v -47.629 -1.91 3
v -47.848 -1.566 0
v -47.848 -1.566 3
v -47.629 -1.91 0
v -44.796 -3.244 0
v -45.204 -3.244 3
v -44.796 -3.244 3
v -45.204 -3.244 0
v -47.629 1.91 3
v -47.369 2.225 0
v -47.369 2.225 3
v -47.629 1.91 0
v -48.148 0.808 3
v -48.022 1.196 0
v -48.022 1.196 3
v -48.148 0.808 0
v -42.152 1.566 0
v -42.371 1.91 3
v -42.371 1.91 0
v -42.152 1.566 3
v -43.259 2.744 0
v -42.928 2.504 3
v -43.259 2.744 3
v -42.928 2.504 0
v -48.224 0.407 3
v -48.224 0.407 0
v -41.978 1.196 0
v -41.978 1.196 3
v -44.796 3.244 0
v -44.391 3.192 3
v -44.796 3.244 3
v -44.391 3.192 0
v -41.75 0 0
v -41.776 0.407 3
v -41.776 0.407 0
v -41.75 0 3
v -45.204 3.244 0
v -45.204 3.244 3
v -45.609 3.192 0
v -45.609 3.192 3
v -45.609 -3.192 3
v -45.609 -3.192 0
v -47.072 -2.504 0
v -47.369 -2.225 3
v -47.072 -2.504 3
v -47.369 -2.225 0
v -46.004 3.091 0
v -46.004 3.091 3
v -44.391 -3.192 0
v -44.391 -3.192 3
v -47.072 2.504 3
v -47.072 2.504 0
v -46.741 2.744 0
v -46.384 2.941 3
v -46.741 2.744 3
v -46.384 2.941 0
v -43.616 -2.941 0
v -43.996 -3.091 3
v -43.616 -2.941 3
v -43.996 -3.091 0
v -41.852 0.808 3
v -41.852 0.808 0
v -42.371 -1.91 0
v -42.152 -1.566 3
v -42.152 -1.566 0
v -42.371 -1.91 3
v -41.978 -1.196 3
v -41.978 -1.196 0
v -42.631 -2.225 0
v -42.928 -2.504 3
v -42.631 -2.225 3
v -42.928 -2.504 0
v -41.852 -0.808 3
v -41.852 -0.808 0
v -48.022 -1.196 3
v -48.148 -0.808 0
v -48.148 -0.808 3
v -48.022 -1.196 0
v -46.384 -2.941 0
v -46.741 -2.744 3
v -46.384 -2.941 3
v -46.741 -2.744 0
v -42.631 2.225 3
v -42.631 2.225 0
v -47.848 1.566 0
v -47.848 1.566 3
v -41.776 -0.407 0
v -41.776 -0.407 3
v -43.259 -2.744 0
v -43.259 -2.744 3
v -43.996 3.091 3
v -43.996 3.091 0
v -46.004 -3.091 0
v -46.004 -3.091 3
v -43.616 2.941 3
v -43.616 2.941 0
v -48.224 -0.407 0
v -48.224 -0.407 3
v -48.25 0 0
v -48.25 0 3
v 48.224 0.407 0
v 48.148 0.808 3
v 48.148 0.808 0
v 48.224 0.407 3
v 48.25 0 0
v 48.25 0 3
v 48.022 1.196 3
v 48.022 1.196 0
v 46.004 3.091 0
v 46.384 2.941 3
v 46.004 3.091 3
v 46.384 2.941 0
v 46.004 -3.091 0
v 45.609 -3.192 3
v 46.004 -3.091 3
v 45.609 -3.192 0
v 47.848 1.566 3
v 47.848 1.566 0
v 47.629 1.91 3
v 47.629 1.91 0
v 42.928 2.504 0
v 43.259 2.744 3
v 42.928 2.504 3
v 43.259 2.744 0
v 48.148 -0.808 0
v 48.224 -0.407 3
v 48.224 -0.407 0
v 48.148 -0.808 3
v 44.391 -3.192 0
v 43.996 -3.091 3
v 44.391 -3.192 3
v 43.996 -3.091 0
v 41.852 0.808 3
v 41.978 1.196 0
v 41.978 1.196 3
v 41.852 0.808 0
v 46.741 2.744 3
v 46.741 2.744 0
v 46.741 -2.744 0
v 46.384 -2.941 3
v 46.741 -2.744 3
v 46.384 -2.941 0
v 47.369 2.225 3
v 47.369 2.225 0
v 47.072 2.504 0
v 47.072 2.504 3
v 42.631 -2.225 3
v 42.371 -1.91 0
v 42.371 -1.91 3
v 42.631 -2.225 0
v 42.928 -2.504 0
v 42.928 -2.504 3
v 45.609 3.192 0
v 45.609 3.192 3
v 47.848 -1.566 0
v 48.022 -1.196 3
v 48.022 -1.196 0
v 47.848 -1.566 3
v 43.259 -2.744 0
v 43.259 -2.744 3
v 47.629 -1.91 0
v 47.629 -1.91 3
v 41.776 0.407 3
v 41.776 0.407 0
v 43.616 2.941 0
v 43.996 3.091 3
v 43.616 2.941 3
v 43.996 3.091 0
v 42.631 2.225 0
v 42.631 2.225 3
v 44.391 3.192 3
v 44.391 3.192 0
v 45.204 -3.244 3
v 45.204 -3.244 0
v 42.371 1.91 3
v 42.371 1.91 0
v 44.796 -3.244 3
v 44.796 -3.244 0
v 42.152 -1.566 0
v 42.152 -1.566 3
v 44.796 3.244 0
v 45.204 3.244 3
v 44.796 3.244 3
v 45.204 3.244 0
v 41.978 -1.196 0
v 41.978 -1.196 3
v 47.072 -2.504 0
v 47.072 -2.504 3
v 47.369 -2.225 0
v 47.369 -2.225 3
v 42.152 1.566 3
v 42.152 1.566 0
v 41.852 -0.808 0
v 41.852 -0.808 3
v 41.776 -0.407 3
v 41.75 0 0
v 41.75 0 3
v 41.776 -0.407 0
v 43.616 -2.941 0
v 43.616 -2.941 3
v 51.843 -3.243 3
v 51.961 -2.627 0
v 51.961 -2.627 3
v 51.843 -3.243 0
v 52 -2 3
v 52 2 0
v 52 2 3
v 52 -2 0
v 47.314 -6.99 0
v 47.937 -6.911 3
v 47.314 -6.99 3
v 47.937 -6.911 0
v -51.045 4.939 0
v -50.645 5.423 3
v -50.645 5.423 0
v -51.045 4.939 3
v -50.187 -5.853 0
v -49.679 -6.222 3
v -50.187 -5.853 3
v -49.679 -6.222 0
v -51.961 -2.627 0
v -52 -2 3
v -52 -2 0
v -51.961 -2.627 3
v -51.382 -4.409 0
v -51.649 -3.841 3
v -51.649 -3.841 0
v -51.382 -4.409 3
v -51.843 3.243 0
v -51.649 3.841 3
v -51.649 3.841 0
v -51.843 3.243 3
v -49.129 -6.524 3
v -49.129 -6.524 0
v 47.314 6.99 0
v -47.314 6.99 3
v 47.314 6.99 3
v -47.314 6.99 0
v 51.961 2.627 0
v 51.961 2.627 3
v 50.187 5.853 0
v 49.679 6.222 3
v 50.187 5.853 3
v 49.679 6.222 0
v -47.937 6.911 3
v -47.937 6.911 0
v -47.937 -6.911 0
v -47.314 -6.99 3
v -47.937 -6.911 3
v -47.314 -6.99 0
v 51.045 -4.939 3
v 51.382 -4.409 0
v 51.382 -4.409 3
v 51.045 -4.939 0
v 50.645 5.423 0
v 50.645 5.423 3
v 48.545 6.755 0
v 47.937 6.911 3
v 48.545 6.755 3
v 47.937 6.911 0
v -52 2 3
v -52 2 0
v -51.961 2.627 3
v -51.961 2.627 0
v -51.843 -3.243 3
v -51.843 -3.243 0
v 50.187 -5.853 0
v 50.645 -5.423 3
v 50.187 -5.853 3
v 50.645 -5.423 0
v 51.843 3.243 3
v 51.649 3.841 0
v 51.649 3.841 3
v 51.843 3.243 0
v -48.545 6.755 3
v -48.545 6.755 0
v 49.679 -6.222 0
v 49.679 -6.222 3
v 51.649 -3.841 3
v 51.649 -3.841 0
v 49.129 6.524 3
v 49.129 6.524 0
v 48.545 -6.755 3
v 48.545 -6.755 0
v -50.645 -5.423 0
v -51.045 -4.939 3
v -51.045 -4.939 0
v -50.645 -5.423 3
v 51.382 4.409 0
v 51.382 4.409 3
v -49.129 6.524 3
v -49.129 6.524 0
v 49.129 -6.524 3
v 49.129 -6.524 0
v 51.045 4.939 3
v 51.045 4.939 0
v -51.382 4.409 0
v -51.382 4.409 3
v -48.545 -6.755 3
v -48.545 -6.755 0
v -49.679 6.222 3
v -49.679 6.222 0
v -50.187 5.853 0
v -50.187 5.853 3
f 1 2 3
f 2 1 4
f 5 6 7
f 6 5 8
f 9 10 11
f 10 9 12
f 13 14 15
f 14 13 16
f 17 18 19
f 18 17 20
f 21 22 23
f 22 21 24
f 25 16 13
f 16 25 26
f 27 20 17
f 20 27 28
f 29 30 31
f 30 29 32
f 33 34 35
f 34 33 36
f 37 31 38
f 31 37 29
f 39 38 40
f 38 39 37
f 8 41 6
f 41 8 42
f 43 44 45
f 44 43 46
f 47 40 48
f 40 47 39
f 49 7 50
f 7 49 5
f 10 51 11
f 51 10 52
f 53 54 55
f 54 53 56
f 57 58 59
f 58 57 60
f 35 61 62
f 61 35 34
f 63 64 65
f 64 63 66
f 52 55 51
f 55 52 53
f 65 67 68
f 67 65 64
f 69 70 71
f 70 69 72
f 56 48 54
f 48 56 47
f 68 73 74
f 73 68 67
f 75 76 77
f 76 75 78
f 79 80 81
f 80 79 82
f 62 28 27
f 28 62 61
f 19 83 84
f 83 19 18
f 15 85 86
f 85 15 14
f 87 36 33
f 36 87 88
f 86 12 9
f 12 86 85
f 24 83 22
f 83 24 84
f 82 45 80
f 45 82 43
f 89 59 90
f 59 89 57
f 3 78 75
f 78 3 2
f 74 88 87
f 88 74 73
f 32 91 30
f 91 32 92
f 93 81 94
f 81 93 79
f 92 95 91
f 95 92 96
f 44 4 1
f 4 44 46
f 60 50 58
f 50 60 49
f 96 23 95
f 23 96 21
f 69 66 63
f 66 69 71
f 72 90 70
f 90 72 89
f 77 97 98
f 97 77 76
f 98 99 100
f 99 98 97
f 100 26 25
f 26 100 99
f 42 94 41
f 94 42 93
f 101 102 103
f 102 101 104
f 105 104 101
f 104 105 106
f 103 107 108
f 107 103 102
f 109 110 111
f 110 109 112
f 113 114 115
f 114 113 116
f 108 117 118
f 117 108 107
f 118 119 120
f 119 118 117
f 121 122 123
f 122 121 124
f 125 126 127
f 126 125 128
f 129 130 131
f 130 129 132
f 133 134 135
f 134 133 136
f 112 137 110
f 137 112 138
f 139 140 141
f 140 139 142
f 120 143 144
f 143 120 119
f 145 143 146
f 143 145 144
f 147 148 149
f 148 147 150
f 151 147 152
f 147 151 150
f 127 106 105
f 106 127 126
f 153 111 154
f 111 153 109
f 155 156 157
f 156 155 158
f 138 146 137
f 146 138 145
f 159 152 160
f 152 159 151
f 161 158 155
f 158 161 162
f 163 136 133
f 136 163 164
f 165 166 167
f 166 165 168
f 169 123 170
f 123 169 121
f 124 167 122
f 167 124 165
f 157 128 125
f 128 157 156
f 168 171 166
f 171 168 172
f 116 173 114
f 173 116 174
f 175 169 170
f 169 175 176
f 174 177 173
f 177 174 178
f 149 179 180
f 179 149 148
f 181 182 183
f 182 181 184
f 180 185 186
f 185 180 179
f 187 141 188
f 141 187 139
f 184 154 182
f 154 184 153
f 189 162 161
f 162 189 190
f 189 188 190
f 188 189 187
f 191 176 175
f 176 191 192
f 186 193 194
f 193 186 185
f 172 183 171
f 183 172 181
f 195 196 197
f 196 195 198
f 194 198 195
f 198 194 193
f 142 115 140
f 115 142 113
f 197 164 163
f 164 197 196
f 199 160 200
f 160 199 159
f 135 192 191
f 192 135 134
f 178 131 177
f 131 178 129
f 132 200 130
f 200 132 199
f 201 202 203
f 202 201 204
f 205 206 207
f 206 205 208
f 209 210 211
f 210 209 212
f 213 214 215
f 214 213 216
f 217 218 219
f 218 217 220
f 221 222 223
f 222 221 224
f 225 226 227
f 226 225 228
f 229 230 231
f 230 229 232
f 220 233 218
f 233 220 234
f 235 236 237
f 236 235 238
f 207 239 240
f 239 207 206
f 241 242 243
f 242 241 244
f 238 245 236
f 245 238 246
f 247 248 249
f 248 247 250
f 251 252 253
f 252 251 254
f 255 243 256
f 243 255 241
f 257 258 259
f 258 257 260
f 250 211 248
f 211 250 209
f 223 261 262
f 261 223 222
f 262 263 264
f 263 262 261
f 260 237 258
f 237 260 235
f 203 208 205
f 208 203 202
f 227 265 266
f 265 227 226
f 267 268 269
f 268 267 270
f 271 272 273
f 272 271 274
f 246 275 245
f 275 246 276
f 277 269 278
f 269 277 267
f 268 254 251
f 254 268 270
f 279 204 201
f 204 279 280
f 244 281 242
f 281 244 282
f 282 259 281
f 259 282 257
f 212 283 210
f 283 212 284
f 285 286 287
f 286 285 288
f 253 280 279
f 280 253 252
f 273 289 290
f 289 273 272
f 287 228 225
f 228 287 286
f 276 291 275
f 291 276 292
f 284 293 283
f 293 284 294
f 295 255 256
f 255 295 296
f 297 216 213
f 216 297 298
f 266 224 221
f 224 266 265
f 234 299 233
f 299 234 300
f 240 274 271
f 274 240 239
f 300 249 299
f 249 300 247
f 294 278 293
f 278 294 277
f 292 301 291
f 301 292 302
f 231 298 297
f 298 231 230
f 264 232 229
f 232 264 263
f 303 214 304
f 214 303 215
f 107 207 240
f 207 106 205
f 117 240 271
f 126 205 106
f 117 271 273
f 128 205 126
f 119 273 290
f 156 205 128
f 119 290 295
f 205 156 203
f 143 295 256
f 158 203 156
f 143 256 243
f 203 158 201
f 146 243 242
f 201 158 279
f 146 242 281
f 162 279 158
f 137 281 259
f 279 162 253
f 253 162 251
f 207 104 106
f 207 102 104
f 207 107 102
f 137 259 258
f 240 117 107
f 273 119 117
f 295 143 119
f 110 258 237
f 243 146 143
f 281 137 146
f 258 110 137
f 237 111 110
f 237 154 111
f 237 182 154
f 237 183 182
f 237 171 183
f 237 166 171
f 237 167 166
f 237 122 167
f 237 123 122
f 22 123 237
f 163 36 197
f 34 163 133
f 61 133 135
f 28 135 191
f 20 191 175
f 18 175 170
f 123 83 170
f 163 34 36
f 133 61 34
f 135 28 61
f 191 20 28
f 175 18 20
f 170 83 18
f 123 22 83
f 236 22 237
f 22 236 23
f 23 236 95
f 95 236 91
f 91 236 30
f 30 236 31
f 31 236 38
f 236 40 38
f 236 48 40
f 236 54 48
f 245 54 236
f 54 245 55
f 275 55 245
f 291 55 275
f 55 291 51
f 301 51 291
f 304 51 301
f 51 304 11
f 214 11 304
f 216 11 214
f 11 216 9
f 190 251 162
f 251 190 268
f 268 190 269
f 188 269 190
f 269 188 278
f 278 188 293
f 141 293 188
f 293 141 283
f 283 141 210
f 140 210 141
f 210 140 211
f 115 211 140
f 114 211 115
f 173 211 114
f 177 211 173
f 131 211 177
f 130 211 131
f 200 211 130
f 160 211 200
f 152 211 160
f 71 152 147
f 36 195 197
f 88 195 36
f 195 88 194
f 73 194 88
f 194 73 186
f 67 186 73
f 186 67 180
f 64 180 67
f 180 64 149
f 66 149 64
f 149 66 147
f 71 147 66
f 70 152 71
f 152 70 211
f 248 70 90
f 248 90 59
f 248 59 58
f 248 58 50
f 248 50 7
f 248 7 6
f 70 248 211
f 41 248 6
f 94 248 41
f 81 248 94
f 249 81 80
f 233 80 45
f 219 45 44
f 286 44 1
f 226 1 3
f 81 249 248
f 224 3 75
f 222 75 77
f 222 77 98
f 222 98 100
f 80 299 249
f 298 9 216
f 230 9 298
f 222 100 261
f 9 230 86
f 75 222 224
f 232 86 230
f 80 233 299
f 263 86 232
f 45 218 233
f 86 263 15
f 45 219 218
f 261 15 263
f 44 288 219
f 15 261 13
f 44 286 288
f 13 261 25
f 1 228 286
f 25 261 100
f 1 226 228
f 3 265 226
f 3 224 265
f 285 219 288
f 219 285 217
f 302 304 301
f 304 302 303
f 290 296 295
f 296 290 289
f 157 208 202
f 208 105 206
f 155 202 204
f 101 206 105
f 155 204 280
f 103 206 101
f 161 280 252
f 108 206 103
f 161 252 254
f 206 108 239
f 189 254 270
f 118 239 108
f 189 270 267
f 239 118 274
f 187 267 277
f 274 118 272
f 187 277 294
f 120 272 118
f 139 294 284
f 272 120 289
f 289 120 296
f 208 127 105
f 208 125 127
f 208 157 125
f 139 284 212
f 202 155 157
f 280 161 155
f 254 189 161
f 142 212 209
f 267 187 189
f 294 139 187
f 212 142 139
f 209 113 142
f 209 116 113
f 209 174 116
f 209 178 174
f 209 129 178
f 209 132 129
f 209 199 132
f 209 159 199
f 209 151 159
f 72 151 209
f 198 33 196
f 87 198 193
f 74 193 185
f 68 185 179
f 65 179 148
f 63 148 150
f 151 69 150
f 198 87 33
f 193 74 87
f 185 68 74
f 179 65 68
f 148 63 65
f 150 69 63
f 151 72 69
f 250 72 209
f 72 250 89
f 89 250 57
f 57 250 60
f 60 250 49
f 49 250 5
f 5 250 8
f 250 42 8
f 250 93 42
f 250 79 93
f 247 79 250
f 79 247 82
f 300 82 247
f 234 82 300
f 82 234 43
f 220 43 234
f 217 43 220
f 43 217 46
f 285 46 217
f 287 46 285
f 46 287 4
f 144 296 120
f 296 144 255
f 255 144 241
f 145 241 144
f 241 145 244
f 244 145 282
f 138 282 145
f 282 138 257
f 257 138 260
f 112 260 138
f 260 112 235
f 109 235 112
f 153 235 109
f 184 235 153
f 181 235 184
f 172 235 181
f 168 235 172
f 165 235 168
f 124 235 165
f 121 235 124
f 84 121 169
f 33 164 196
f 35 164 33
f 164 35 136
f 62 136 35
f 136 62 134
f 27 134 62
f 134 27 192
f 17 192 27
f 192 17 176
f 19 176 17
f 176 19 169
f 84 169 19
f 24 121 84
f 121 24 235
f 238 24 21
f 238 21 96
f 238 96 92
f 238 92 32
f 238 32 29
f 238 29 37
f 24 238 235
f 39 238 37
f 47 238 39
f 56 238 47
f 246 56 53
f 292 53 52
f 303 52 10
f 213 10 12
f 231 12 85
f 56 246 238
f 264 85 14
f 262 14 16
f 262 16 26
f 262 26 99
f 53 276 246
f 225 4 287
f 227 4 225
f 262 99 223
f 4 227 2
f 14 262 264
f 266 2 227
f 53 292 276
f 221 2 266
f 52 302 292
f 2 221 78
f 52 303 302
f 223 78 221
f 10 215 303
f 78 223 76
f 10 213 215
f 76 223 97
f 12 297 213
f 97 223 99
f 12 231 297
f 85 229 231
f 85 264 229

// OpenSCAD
$fn = 50;


difference() {
	union() {
		hull() {
			translate(v = [-47.0000000000, 2.0000000000, 0]) {
				cylinder(h = 3, r = 5);
			}
			translate(v = [47.0000000000, 2.0000000000, 0]) {
				cylinder(h = 3, r = 5);
			}
			translate(v = [-47.0000000000, -2.0000000000, 0]) {
				cylinder(h = 3, r = 5);
			}
			translate(v = [47.0000000000, -2.0000000000, 0]) {
				cylinder(h = 3, r = 5);
			}
		}
	}
	union() {
		translate(v = [-45.0000000000, 0.0000000000, -100.0000000000]) {
			cylinder(h = 200, r = 3.2500000000);
		}
		translate(v = [-45.0000000000, 0.0000000000, -100.0000000000]) {
			cylinder(h = 200, r = 3.2500000000);
		}
		translate(v = [45.0000000000, 0.0000000000, -100.0000000000]) {
			cylinder(h = 200, r = 3.2500000000);
		}
		translate(v = [45.0000000000, 0.0000000000, -100.0000000000]) {
			cylinder(h = 200, r = 3.2500000000);
		}
	}
}
